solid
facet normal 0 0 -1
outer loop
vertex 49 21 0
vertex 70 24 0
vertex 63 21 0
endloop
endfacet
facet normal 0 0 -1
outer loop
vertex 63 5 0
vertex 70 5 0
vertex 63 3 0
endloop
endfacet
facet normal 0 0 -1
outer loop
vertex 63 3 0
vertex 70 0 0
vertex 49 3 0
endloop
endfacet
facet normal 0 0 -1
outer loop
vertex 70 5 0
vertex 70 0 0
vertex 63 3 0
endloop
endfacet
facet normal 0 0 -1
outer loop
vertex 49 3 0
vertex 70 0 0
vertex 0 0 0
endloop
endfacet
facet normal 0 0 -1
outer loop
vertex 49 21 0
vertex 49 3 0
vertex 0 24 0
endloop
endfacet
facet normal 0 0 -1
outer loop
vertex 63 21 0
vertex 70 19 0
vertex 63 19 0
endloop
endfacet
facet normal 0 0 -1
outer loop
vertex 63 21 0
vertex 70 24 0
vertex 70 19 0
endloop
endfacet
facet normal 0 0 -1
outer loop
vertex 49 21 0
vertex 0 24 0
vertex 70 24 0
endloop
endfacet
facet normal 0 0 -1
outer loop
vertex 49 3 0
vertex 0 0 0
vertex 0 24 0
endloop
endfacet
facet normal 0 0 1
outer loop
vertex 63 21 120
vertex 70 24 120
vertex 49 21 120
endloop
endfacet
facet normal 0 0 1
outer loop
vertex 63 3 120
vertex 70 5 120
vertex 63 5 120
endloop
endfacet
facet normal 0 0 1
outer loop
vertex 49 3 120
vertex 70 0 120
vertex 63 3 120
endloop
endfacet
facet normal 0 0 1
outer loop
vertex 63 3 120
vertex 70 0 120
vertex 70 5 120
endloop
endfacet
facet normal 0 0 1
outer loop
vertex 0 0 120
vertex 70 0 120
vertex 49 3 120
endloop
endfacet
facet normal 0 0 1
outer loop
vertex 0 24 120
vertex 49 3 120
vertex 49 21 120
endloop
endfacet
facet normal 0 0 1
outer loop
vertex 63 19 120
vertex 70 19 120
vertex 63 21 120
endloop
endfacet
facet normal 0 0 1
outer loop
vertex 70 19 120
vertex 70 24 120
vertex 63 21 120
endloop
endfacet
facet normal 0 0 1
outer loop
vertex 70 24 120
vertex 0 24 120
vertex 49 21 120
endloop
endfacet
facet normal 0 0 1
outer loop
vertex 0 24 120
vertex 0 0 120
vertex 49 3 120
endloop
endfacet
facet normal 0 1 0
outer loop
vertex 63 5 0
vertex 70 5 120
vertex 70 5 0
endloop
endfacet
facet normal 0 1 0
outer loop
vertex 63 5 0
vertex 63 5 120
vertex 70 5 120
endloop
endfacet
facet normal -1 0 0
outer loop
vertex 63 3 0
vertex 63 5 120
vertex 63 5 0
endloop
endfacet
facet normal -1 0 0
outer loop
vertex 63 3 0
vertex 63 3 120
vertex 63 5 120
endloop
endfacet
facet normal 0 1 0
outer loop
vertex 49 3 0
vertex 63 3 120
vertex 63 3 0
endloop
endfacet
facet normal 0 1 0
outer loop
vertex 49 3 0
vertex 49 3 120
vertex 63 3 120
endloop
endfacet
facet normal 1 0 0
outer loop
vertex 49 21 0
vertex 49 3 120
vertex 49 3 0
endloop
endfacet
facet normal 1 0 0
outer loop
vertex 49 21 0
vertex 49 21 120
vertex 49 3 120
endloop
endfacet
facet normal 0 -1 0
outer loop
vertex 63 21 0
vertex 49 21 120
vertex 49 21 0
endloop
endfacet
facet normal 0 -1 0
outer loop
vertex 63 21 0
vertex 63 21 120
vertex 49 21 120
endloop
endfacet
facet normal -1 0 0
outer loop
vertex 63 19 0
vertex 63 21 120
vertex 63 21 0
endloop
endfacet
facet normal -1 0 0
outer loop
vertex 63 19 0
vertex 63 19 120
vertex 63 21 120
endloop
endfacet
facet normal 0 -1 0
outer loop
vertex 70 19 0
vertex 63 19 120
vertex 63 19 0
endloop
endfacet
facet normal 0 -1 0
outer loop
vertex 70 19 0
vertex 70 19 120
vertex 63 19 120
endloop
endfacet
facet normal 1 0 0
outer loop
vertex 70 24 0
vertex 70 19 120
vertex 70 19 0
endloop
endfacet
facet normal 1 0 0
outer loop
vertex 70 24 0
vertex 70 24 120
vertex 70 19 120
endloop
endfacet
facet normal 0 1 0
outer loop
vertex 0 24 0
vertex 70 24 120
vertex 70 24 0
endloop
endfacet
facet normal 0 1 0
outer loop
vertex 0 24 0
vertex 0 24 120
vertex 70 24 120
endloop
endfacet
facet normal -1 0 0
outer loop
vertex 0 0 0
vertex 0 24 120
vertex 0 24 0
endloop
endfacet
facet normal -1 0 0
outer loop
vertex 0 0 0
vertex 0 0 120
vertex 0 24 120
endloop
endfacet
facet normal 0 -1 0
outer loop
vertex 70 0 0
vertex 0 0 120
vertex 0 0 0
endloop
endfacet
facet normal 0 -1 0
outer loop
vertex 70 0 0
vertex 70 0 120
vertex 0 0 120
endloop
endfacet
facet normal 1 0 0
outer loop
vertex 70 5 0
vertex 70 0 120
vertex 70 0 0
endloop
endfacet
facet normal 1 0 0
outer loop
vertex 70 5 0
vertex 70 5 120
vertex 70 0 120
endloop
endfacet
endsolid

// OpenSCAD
$fn = 32;

// ----------------------------------------------------------------------
// T-slot rail: 70 x 24 mm section, 120 mm long
// ----------------------------------------------------------------------

// --- parameters (mm) ---
profile_height = 120;     // extrusion height
profile_points = 12;      // points of the closed outline

profile = [[0, 0], [70, 0], [70, 5], [63, 5], [63, 3], [49, 3], [49, 21], [63, 21], [63, 19], [70, 19], [70, 24], [0, 24]];  // single closed polygon, 12 points, counter clockwise

// --- the one profile operation ---
linear_extrude(height = profile_height) polygon(points = profile);
